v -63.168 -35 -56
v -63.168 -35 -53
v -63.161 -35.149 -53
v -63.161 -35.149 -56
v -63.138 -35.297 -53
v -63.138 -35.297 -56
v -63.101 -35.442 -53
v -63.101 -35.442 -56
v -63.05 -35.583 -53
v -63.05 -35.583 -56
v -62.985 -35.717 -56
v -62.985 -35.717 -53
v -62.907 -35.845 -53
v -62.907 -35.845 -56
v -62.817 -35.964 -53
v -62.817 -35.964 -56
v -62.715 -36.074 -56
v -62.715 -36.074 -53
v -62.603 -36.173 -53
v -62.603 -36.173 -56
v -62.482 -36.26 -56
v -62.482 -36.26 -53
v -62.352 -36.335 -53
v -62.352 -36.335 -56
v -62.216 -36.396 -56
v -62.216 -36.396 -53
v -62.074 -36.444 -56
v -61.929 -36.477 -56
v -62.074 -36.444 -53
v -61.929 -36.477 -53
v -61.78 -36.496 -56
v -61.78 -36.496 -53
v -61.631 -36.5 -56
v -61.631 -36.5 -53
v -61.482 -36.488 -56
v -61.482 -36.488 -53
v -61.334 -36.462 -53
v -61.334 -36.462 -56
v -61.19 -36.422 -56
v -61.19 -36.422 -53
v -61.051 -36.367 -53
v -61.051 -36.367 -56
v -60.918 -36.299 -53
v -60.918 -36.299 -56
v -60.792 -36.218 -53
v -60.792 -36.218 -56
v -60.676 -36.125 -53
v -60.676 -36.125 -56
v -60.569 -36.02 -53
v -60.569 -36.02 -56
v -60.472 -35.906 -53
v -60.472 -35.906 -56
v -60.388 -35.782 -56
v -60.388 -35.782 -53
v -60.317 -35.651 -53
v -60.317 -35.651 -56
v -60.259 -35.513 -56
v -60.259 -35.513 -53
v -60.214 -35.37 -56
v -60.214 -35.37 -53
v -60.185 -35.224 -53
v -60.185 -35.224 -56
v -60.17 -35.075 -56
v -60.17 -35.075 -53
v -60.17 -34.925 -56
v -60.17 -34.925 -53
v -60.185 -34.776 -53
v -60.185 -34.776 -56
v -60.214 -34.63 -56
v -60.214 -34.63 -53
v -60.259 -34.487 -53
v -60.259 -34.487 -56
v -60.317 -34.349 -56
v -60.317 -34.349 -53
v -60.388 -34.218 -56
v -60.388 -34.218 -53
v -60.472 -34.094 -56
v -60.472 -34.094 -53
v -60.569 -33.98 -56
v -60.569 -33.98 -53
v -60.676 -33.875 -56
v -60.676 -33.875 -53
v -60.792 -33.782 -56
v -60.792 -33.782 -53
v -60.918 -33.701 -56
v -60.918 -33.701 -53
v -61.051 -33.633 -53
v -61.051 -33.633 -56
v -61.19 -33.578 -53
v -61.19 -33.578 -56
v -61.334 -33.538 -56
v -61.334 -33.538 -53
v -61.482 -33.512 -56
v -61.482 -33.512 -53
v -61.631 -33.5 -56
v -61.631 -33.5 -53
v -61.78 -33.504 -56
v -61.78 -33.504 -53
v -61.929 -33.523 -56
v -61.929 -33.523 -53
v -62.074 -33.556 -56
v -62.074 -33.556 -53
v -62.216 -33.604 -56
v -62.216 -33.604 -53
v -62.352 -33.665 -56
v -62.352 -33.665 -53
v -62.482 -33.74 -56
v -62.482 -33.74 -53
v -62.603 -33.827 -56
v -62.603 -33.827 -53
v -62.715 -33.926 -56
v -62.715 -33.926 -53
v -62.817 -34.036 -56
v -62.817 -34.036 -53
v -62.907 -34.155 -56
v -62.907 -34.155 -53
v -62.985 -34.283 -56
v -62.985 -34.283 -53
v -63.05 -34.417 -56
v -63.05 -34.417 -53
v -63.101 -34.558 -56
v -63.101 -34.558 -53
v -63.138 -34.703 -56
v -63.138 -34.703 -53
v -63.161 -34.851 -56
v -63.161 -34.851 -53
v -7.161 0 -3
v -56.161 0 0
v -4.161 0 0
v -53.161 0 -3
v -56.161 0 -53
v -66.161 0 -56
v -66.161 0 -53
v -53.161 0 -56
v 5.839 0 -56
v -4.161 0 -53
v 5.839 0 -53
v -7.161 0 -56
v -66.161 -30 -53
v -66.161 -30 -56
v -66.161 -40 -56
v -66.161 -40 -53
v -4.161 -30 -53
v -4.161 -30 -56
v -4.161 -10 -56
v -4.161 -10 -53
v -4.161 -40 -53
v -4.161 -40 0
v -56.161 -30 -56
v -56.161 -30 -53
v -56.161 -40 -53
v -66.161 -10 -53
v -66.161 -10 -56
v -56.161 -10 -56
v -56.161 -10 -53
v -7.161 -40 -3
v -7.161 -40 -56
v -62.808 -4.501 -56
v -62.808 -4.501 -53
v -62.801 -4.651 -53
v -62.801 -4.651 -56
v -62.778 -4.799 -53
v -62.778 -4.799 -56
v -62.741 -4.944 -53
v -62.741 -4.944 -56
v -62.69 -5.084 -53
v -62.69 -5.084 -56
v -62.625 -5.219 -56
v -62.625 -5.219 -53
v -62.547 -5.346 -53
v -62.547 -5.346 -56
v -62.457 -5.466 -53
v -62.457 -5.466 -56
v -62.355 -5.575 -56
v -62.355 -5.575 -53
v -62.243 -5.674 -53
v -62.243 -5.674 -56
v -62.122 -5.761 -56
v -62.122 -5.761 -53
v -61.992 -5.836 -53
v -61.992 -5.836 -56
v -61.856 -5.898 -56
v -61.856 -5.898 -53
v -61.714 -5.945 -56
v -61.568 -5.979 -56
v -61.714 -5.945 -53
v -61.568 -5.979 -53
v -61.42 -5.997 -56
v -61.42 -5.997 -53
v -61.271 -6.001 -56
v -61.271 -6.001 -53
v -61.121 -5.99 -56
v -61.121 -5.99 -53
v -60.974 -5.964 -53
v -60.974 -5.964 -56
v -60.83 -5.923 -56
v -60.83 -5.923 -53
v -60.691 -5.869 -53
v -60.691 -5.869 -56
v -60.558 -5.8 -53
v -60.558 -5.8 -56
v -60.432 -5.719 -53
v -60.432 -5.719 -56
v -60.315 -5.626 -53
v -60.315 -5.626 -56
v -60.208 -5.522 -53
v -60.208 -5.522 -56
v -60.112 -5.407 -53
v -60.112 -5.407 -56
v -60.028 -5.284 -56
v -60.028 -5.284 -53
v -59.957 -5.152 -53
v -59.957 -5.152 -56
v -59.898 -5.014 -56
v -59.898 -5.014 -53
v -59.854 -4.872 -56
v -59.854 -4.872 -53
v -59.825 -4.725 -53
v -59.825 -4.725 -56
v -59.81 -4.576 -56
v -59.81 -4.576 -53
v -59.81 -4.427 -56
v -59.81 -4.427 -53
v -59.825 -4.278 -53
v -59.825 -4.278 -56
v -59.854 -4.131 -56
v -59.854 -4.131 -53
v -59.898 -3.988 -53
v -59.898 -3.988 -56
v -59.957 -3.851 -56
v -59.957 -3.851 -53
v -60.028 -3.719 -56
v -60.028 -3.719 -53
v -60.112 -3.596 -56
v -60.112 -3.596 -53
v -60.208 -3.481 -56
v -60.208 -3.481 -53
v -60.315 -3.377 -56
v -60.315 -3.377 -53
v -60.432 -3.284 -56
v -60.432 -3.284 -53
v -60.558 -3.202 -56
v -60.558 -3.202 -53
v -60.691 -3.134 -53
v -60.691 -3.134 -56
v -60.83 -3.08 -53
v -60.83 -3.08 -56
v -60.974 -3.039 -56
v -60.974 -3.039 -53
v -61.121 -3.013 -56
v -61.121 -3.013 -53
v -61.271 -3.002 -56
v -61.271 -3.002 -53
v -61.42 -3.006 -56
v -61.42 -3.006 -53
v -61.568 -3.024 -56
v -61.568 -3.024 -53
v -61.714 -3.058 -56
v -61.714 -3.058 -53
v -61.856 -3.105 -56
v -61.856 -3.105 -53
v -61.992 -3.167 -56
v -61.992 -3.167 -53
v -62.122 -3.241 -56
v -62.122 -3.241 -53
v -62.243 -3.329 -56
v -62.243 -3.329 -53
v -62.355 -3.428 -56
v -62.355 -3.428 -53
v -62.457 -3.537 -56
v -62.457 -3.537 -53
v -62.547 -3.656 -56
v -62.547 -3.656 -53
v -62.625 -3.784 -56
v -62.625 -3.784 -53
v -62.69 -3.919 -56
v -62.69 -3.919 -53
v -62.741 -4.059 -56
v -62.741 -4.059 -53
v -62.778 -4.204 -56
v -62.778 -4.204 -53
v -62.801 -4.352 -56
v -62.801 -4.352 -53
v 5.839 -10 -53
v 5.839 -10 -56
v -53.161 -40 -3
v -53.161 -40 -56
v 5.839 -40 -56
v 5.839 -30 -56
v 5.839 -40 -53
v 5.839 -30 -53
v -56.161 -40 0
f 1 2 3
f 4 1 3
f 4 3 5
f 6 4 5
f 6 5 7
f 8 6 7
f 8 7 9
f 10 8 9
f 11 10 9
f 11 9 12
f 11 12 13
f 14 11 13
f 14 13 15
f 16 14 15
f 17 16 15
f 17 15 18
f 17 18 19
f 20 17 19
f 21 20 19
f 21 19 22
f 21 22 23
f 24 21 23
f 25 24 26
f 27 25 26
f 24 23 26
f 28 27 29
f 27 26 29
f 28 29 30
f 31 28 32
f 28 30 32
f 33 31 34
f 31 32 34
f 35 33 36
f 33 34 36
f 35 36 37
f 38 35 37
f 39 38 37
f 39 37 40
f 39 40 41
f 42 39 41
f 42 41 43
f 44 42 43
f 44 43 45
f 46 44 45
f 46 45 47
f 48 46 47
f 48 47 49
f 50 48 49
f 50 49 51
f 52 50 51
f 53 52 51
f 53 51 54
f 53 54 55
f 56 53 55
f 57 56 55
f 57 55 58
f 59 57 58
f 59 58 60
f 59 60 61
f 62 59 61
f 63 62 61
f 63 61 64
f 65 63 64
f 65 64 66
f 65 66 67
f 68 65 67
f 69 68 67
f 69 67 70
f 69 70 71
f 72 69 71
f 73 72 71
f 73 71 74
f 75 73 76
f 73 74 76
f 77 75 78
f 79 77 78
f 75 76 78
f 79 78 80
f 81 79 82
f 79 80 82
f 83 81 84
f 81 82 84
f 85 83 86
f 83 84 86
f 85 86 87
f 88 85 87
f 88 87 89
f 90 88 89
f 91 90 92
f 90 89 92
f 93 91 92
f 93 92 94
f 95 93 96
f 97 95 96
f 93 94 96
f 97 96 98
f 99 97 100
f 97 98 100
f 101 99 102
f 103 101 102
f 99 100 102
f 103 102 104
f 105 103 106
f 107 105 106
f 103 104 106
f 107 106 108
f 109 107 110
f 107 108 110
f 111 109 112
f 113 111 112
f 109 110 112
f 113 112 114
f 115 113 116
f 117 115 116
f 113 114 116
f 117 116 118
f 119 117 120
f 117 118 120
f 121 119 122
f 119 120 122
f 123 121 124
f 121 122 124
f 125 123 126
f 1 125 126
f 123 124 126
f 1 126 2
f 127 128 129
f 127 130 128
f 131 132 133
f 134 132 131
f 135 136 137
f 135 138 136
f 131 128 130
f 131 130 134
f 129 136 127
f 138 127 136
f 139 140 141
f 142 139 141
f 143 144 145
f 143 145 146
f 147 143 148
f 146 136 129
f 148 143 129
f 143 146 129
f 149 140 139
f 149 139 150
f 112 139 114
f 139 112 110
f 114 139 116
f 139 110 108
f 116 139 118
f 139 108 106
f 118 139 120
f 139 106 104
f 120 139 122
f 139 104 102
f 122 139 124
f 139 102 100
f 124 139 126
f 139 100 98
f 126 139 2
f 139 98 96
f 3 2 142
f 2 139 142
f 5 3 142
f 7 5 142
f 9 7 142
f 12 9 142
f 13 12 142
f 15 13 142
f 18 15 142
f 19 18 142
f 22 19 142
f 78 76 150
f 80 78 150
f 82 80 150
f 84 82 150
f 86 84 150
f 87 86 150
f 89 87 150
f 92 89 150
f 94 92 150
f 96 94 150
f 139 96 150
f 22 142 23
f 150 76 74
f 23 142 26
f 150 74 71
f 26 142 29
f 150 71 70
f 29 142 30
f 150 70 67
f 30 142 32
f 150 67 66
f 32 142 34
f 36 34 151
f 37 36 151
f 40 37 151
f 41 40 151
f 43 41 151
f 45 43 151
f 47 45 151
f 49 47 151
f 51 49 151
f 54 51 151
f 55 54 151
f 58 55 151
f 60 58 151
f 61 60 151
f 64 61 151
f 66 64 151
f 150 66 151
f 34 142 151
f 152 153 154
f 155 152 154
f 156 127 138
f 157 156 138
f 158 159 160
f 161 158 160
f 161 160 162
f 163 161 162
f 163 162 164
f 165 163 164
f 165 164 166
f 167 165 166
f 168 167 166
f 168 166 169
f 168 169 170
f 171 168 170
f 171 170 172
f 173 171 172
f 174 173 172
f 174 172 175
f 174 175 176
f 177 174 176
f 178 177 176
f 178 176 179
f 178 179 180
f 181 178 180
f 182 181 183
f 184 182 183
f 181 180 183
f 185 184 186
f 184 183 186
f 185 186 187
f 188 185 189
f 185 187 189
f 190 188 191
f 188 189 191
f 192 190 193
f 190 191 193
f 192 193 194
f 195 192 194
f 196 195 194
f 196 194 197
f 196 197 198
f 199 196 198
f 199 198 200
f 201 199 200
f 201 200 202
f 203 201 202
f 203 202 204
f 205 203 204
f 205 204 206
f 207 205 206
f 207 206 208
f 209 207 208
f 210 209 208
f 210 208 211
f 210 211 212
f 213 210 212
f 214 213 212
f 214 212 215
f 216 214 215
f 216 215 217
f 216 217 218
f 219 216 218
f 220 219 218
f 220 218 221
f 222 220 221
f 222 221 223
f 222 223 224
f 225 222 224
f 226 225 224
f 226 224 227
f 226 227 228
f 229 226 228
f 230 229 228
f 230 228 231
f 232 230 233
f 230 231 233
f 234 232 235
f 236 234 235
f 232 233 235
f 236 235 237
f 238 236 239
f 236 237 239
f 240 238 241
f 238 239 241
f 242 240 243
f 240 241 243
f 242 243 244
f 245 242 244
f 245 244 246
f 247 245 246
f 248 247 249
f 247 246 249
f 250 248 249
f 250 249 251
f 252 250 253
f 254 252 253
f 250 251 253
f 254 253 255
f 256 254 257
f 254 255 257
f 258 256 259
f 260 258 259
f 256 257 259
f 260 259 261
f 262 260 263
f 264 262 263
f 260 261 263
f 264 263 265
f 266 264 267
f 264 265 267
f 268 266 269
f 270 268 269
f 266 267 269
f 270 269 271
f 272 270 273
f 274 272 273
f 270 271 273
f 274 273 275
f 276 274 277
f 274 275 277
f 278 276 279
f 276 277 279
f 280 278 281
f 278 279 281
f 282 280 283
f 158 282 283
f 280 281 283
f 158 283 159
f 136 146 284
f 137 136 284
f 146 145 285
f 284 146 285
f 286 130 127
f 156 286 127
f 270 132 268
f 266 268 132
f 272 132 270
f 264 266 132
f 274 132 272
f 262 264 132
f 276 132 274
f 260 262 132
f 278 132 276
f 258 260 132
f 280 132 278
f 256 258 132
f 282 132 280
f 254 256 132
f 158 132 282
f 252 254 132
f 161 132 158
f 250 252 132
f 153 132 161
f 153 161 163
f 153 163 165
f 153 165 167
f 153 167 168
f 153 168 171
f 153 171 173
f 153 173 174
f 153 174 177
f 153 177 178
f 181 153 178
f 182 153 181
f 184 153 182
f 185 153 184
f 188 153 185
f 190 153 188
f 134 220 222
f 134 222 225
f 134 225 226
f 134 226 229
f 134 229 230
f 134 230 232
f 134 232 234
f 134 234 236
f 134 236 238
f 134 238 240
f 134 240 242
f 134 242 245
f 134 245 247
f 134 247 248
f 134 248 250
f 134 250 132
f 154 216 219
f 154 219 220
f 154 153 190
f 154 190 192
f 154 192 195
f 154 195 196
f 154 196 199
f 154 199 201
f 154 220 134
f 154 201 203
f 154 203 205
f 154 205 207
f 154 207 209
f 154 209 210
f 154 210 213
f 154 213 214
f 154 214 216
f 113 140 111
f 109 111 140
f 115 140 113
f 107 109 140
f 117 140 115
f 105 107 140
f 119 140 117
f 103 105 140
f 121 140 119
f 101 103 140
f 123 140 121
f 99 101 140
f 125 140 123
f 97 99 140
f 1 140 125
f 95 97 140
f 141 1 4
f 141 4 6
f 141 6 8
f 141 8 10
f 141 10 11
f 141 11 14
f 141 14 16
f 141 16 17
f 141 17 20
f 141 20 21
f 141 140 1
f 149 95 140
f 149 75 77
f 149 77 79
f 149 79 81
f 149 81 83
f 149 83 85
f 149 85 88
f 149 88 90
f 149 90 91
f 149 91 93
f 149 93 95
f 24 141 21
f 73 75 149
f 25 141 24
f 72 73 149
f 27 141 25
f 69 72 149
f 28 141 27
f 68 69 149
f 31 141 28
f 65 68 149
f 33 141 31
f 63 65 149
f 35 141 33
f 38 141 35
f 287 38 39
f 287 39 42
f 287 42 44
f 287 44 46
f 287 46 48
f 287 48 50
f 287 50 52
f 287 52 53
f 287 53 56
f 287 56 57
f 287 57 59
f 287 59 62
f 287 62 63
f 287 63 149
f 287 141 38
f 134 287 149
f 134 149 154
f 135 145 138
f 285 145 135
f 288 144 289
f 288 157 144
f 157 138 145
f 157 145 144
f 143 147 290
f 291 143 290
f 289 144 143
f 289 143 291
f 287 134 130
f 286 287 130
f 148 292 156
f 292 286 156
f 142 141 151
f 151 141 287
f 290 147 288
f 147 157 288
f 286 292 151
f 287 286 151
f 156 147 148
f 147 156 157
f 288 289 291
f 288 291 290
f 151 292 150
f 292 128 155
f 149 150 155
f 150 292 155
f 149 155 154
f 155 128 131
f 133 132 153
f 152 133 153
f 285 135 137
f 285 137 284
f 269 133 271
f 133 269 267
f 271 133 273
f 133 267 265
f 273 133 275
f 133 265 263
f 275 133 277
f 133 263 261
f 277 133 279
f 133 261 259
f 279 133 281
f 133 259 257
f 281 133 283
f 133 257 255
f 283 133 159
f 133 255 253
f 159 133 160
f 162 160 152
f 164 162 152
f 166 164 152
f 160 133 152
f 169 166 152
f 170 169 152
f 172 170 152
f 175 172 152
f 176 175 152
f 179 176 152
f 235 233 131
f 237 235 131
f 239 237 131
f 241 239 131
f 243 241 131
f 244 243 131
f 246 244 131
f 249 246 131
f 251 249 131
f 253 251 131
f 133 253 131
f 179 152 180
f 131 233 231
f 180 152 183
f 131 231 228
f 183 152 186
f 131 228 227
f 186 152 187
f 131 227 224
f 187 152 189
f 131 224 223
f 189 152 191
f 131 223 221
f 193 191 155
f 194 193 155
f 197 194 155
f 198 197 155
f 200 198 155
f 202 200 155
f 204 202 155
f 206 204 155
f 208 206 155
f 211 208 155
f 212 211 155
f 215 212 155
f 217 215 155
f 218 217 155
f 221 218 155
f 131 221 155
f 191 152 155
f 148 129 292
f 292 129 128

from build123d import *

# Parameters (mm, degrees)
F1_DEPTH = 40
F3_W     = 10
F3_H     = 10
F4_DEPTH = 3
F2_W     = 10
F2_H     = 10
F5_DEPTH = 3
F6_W     = 10
F6_H     = 10
F7_DEPTH = 3
F8_W     = 10
F8_H     = 10
F9_DEPTH = 3
F11_D    = 3


# Not quite as in the source:
# - a feature of the source that left no trace in its solid (it failed there, or was rolled back) is left out
# - a feature names something its author has since deleted; it is built from what else it names


with BuildPart() as f1:
    # F0 (on Front) → F1 (new body)
    with BuildSketch(Plane.XZ):
        Polygon((-56.1606403851, 0), (-56.1606403851, -56), (-53.1606403851, -56), (-53.1606403851, -3), (-7.1606403851, -3), (-7.1606403851, -56), (-4.1606403851, -56), (-4.1606403851, 0), align=None)
    extrude(amount=F1_DEPTH)

    # F3 (on face) → F4 (join)
    with BuildSketch(Plane(origin=(0, 0, -56), x_dir=(1, 0, 0), z_dir=(0, 0, -1))):
        with Locations((0.8393596149, 5)):
            Rectangle(F3_W, F3_H)
    extrude(amount=-F4_DEPTH)

    # F2 (on face) → F5 (join)
    with BuildSketch(Plane(origin=(0, 0, -56), x_dir=(1, 0, 0), z_dir=(0, 0, -1))):
        with Locations((-61.1606403851, 5)):
            Rectangle(F2_W, F2_H)
    extrude(amount=-F5_DEPTH)

    # F6 (on face) → F7 (join)
    with BuildSketch(Plane(origin=(0, 0, -56), x_dir=(1, 0, 0), z_dir=(0, 0, -1))):
        with Locations((0.8393596149, 35)):
            Rectangle(F6_W, F6_H)
    extrude(amount=-F7_DEPTH)

    # F8 (on face) → F9 (join)
    with BuildSketch(Plane(origin=(0, 0, -56), x_dir=(1, 0, 0), z_dir=(0, 0, -1))):
        with Locations((-61.1606403851, 35)):
            Rectangle(F8_W, F8_H)
    extrude(amount=-F9_DEPTH)

    # F11 (through all)
    with Locations(Plane(origin=(0, 0, -56), x_dir=(1, 0, 0), z_dir=(0, 0, -1))):
        with Locations((-61.6680905223, 35), (18.8430529088, 95.1308980584), (-61.3079555333, 4.5014377683), (19.3945541978, 4.6852682717)):
            Hole(F11_D / 2)


solid = f1.part
